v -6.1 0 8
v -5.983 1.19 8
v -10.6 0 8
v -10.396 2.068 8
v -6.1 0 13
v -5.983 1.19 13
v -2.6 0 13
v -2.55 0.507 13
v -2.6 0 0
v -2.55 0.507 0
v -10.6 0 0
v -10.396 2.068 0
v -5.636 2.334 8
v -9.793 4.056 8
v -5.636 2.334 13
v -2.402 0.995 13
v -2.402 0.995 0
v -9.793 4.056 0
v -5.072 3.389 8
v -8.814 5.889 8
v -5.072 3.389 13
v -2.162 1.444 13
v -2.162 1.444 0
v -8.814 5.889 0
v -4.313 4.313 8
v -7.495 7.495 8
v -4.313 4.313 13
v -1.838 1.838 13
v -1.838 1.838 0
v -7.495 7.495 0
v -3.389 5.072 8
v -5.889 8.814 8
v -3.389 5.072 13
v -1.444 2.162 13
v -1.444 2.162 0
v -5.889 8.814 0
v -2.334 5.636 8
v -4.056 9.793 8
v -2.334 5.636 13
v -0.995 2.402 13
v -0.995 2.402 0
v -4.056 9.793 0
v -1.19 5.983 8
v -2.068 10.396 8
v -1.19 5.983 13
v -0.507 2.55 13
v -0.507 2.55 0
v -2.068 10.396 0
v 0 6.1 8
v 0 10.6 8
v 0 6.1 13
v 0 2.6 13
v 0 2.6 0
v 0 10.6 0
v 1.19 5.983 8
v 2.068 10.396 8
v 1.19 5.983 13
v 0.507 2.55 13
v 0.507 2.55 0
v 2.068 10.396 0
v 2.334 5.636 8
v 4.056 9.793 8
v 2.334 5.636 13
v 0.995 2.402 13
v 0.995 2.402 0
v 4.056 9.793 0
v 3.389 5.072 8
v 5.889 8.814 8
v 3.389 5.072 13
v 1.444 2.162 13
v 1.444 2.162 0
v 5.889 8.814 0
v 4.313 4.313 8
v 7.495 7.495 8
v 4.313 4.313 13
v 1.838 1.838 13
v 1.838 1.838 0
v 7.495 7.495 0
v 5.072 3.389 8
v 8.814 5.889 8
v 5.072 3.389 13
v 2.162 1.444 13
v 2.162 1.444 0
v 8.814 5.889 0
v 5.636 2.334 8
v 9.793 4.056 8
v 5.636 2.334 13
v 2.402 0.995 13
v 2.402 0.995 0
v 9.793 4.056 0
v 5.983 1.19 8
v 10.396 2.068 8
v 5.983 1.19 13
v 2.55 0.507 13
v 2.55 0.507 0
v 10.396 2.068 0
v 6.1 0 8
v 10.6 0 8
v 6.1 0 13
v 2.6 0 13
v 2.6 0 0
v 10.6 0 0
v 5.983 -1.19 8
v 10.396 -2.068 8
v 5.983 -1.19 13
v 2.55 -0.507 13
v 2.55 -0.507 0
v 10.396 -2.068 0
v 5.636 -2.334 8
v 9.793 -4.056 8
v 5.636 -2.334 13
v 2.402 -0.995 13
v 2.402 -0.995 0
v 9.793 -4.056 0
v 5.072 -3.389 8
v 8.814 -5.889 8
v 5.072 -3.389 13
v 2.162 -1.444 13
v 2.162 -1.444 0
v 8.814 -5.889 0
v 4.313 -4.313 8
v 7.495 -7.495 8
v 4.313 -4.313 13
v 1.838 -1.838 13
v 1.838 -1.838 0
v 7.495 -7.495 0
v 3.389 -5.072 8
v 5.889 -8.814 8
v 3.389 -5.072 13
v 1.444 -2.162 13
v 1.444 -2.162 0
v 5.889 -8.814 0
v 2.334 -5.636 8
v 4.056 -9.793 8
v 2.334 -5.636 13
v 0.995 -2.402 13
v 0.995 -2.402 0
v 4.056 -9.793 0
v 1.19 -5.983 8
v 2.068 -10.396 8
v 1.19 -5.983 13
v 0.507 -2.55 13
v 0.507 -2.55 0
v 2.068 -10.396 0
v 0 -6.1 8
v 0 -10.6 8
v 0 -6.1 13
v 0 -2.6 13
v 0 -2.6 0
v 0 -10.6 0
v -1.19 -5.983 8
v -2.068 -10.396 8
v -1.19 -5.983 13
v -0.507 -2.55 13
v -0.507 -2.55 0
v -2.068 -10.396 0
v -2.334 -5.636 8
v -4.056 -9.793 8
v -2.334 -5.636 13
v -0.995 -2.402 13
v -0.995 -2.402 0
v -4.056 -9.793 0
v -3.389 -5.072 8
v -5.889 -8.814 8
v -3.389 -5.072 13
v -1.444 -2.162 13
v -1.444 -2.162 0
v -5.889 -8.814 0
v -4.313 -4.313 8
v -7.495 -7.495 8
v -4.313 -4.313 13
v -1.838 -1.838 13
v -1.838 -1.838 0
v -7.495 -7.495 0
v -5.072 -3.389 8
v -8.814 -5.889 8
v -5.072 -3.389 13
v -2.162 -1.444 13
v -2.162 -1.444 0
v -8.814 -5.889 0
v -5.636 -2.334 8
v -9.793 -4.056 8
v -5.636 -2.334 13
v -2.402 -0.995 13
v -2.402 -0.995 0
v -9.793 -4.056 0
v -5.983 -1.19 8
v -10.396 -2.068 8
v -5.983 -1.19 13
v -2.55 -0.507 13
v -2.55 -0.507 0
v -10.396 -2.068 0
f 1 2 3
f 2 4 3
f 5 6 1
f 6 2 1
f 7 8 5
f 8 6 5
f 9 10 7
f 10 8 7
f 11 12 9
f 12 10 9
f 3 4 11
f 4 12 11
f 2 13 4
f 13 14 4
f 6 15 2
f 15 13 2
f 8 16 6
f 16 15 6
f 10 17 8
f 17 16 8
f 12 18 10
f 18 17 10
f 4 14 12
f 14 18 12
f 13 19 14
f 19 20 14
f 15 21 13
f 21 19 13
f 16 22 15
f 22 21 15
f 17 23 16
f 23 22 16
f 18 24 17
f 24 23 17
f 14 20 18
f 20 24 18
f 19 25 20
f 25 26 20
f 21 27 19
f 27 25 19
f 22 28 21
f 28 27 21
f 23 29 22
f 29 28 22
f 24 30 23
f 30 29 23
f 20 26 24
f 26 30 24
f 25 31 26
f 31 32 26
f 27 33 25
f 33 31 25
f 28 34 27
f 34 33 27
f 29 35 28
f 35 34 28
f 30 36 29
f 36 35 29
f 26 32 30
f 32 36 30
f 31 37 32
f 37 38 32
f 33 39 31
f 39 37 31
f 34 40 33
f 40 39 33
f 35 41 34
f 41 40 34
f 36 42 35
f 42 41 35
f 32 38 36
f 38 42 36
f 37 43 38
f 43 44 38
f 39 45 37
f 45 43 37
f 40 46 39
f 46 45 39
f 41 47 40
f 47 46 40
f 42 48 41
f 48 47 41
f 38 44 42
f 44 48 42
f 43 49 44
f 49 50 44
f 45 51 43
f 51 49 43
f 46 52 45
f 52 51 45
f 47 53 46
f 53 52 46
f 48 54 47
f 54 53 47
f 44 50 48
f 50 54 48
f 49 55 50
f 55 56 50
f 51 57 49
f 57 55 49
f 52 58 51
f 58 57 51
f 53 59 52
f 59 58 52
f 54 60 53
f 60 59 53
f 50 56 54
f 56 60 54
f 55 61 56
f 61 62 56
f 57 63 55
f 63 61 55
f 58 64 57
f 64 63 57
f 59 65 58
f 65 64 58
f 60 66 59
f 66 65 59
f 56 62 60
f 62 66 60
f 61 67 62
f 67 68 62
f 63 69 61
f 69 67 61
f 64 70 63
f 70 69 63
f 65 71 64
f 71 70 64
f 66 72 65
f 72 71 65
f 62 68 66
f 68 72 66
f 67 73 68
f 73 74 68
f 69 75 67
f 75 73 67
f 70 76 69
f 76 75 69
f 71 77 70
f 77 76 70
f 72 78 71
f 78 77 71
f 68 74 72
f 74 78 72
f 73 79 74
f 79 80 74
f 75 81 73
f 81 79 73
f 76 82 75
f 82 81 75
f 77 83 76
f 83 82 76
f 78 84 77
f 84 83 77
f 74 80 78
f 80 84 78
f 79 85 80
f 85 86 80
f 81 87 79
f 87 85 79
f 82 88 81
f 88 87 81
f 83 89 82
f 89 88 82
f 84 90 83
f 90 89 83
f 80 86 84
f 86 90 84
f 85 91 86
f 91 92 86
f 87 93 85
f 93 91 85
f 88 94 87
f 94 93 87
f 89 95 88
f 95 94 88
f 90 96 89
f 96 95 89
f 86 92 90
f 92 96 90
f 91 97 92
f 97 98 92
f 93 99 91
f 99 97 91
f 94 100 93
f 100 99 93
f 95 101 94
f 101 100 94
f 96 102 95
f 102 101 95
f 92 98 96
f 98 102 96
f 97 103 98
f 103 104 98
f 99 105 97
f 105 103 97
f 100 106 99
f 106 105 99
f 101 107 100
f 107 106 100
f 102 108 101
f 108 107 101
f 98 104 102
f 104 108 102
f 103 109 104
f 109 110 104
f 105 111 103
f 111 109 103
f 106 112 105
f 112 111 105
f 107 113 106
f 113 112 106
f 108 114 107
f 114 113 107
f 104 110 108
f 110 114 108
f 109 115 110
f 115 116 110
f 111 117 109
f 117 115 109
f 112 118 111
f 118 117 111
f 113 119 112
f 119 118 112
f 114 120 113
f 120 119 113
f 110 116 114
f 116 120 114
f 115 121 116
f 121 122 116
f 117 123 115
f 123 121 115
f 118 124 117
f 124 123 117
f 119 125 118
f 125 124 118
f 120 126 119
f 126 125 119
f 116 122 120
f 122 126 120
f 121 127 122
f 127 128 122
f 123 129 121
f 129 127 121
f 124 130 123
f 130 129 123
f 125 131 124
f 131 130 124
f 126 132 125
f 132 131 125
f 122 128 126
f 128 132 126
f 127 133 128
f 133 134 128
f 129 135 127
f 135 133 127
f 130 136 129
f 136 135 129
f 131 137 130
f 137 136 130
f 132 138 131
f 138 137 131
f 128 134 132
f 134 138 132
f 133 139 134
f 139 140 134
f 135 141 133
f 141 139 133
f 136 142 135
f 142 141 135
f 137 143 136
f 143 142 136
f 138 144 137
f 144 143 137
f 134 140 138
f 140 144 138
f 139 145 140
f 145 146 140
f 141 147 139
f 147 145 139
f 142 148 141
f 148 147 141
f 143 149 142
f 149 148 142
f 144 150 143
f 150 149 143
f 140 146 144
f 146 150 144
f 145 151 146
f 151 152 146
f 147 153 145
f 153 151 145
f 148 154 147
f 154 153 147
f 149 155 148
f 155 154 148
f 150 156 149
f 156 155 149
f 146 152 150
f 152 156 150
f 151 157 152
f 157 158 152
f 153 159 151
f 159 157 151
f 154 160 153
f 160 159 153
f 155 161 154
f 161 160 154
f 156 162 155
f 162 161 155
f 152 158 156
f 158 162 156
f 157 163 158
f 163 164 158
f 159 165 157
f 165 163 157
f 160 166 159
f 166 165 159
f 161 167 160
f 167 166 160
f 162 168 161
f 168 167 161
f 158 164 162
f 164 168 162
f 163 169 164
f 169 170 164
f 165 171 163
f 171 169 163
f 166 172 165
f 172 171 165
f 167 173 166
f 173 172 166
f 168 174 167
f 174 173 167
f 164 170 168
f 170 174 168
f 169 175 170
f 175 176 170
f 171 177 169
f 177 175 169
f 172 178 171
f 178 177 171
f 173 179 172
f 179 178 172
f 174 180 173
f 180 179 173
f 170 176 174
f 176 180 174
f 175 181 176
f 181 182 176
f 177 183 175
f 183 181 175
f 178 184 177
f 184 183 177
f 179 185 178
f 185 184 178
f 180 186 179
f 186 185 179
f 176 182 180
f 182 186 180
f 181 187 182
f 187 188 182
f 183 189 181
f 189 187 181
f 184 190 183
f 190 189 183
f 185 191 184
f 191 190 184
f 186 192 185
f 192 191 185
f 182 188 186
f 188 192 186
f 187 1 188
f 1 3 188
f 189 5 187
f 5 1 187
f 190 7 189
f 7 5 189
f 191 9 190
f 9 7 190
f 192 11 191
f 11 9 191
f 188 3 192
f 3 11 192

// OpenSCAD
$fn = 32;

// ----------------------------------------------------------------------
// Form washer: stepped_c washer, 21.2 mm outside, 5.2 mm bore
// ----------------------------------------------------------------------

// --- parameters (mm) ---
revolve_angle = 360;      // full turn around the Z axis
profile_points = 6;       // points of the closed outline

profile = [[2.6, 0], [10.6, 0], [10.6, 8], [6.1, 8], [6.1, 13], [2.6, 13]];  // single closed polygon, 6 points, counter clockwise

// --- the one profile operation ---
rotate_extrude(angle = revolve_angle) polygon(points = profile);
